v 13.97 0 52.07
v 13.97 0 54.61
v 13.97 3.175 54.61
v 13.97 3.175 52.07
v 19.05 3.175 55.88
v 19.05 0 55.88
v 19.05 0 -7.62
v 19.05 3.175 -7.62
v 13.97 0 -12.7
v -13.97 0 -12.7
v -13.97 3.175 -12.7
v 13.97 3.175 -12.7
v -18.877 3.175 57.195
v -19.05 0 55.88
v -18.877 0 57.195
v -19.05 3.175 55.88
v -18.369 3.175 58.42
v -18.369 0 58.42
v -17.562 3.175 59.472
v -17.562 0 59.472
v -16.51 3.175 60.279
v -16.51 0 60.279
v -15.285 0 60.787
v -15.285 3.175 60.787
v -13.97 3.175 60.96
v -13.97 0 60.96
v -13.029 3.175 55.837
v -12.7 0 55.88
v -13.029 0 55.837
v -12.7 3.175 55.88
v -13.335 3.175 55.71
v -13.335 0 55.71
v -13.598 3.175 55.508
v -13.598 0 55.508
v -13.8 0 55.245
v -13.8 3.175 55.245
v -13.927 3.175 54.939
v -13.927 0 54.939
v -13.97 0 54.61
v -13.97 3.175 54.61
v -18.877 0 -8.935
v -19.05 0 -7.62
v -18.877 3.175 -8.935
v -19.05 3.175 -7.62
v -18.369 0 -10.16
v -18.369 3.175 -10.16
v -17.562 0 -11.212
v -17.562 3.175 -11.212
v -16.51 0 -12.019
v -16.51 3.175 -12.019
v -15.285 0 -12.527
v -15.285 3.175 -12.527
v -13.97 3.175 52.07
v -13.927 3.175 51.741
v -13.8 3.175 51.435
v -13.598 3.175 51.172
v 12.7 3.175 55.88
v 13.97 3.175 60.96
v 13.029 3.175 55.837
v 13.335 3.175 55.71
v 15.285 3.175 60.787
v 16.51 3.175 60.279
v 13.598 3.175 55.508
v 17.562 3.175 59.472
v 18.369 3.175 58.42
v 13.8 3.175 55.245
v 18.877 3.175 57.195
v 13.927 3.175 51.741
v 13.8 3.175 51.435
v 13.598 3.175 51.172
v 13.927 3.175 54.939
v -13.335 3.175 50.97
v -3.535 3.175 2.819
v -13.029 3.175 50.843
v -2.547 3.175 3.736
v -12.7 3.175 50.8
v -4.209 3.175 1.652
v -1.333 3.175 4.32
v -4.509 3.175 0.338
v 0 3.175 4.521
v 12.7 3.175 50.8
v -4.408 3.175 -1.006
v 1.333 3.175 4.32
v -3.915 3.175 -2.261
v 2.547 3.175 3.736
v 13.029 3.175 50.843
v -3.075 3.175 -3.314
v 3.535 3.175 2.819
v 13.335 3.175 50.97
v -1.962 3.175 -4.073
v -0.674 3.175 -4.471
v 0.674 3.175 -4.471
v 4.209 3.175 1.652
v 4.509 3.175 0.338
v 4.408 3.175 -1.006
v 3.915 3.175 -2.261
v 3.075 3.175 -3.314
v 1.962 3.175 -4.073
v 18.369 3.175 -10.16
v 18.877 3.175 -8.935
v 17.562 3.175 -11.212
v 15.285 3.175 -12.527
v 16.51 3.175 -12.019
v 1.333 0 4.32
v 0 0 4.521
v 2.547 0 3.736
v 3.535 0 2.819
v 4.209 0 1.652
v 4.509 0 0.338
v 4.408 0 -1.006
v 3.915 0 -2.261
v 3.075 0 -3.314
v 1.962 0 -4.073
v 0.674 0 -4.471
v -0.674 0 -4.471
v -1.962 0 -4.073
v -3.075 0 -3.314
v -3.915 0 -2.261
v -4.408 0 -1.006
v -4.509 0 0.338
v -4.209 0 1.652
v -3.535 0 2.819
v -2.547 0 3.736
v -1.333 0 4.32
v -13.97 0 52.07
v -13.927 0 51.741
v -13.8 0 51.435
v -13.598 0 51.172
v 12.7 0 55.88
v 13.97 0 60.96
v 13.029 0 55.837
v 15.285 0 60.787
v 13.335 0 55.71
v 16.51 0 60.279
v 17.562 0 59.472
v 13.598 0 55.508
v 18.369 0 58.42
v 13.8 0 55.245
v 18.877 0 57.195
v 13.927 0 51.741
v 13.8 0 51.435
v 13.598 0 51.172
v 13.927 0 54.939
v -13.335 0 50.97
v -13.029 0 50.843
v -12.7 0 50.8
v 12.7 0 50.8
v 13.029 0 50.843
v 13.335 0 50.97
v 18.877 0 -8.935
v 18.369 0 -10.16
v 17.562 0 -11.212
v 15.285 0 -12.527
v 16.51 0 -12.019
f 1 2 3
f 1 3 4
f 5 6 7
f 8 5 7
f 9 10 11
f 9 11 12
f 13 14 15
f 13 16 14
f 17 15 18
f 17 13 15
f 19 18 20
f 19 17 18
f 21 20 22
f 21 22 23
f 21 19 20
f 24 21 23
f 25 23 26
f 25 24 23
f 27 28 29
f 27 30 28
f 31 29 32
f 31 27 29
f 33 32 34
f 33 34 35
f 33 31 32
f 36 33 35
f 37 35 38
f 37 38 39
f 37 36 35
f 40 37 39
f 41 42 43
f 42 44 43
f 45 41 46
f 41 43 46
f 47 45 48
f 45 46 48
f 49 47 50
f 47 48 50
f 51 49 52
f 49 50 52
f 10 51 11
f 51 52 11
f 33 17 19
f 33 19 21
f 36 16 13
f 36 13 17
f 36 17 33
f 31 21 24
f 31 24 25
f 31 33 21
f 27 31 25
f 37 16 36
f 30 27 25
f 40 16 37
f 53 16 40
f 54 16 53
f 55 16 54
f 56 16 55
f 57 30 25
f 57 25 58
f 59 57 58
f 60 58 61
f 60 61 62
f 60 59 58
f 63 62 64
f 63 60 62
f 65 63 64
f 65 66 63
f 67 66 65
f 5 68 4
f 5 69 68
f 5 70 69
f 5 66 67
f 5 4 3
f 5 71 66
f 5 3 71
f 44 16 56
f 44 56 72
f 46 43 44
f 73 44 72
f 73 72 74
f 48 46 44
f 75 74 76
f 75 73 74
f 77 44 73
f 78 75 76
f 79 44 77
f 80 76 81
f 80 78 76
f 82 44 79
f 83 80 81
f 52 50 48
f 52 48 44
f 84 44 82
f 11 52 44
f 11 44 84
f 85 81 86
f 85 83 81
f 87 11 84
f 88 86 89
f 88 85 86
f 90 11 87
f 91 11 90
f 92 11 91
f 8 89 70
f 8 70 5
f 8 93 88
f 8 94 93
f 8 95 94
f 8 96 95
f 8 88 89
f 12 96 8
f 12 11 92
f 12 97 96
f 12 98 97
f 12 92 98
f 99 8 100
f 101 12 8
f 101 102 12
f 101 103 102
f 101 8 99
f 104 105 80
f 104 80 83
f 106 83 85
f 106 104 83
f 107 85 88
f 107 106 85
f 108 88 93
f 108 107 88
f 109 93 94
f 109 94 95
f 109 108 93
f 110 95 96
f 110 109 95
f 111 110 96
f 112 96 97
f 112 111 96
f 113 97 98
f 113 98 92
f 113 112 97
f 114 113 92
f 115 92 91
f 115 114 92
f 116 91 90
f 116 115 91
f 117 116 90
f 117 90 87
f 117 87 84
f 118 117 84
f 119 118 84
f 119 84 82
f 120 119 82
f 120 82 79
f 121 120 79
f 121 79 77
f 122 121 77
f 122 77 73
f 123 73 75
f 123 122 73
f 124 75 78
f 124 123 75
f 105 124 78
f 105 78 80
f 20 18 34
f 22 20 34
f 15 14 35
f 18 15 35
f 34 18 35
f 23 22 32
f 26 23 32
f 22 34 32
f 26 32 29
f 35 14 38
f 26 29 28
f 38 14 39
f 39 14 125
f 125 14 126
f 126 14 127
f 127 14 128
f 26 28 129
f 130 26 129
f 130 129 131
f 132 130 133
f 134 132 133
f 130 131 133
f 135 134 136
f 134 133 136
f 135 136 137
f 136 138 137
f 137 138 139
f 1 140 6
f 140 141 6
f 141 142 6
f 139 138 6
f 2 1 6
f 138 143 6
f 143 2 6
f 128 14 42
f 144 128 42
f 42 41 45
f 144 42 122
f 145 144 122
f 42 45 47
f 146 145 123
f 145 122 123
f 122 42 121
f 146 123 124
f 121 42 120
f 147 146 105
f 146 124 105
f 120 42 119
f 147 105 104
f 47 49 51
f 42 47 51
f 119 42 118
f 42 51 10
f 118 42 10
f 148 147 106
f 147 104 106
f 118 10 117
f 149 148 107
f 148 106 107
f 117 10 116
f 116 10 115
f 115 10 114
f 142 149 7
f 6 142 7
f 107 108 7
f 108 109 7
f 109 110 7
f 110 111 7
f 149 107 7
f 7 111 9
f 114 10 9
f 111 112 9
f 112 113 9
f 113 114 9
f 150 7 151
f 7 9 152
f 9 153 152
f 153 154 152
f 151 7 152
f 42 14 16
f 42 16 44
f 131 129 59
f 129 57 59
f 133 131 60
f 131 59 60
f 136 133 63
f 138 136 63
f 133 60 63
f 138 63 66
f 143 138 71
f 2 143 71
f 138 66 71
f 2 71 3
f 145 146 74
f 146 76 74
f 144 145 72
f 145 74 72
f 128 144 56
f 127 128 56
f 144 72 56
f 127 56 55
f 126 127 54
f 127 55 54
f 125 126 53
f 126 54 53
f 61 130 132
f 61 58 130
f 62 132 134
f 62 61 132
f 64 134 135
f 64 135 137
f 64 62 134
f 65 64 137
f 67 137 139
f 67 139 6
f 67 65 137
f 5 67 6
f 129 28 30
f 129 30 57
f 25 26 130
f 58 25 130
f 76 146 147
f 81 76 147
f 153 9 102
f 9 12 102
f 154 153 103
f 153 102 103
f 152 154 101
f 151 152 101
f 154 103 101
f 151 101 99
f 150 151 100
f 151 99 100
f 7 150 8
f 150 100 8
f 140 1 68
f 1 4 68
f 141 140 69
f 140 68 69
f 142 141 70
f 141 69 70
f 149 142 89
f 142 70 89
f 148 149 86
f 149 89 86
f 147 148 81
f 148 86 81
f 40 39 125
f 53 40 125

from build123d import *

# Parameters (mm, degrees)
SKETCH1_W           = 38.1
SKETCH1_H           = 73.66
SKETCH1_R           = 4.5212
SKETCH1_W_2         = 27.94
SKETCH1_H_2         = 5.08
BOSS_EXTRUDE1_DEPTH = 3.175
FILLET1_R           = 5.08
FILLET2_R           = 1.27


with BuildPart() as part:
    # Sketch1 → Boss-Extrude1 (new body)
    with BuildSketch(Plane(origin=(0, 0, 0), x_dir=(1, 0, 0), z_dir=(0, 1, 0))):
        with Locations((0, -24.13)):
            Rectangle(SKETCH1_W, SKETCH1_H)
        with Locations(Location((0, 0, 0), (0, 0, 270))):  # turned: the seam where the file's is
            Circle(SKETCH1_R, mode=Mode.SUBTRACT)
        with Locations((0, -53.34)):
            Rectangle(SKETCH1_W_2, SKETCH1_H_2, mode=Mode.SUBTRACT)
    extrude(amount=BOSS_EXTRUDE1_DEPTH)

    # Fillet1
    fillet1_edges = [part.edges().sort_by_distance(p)[0] for p in [
        (-19.05, 1.5875, -12.7),
        (19.05, 1.5875, -12.7),
        (19.05, 1.5875, 60.96),
        (-19.05, 1.5875, 60.96),
    ]]
    fillet(fillet1_edges, radius=FILLET1_R)

    # Fillet2
    fillet2_edges = [part.edges().sort_by_distance(p)[0] for p in [
        (-13.97, 1.5875, 50.8),
        (-13.97, 1.5875, 55.88),
        (13.97, 1.5875, 55.88),
        (13.97, 1.5875, 50.8),
    ]]
    fillet(fillet2_edges, radius=FILLET2_R)


solid = part.part
